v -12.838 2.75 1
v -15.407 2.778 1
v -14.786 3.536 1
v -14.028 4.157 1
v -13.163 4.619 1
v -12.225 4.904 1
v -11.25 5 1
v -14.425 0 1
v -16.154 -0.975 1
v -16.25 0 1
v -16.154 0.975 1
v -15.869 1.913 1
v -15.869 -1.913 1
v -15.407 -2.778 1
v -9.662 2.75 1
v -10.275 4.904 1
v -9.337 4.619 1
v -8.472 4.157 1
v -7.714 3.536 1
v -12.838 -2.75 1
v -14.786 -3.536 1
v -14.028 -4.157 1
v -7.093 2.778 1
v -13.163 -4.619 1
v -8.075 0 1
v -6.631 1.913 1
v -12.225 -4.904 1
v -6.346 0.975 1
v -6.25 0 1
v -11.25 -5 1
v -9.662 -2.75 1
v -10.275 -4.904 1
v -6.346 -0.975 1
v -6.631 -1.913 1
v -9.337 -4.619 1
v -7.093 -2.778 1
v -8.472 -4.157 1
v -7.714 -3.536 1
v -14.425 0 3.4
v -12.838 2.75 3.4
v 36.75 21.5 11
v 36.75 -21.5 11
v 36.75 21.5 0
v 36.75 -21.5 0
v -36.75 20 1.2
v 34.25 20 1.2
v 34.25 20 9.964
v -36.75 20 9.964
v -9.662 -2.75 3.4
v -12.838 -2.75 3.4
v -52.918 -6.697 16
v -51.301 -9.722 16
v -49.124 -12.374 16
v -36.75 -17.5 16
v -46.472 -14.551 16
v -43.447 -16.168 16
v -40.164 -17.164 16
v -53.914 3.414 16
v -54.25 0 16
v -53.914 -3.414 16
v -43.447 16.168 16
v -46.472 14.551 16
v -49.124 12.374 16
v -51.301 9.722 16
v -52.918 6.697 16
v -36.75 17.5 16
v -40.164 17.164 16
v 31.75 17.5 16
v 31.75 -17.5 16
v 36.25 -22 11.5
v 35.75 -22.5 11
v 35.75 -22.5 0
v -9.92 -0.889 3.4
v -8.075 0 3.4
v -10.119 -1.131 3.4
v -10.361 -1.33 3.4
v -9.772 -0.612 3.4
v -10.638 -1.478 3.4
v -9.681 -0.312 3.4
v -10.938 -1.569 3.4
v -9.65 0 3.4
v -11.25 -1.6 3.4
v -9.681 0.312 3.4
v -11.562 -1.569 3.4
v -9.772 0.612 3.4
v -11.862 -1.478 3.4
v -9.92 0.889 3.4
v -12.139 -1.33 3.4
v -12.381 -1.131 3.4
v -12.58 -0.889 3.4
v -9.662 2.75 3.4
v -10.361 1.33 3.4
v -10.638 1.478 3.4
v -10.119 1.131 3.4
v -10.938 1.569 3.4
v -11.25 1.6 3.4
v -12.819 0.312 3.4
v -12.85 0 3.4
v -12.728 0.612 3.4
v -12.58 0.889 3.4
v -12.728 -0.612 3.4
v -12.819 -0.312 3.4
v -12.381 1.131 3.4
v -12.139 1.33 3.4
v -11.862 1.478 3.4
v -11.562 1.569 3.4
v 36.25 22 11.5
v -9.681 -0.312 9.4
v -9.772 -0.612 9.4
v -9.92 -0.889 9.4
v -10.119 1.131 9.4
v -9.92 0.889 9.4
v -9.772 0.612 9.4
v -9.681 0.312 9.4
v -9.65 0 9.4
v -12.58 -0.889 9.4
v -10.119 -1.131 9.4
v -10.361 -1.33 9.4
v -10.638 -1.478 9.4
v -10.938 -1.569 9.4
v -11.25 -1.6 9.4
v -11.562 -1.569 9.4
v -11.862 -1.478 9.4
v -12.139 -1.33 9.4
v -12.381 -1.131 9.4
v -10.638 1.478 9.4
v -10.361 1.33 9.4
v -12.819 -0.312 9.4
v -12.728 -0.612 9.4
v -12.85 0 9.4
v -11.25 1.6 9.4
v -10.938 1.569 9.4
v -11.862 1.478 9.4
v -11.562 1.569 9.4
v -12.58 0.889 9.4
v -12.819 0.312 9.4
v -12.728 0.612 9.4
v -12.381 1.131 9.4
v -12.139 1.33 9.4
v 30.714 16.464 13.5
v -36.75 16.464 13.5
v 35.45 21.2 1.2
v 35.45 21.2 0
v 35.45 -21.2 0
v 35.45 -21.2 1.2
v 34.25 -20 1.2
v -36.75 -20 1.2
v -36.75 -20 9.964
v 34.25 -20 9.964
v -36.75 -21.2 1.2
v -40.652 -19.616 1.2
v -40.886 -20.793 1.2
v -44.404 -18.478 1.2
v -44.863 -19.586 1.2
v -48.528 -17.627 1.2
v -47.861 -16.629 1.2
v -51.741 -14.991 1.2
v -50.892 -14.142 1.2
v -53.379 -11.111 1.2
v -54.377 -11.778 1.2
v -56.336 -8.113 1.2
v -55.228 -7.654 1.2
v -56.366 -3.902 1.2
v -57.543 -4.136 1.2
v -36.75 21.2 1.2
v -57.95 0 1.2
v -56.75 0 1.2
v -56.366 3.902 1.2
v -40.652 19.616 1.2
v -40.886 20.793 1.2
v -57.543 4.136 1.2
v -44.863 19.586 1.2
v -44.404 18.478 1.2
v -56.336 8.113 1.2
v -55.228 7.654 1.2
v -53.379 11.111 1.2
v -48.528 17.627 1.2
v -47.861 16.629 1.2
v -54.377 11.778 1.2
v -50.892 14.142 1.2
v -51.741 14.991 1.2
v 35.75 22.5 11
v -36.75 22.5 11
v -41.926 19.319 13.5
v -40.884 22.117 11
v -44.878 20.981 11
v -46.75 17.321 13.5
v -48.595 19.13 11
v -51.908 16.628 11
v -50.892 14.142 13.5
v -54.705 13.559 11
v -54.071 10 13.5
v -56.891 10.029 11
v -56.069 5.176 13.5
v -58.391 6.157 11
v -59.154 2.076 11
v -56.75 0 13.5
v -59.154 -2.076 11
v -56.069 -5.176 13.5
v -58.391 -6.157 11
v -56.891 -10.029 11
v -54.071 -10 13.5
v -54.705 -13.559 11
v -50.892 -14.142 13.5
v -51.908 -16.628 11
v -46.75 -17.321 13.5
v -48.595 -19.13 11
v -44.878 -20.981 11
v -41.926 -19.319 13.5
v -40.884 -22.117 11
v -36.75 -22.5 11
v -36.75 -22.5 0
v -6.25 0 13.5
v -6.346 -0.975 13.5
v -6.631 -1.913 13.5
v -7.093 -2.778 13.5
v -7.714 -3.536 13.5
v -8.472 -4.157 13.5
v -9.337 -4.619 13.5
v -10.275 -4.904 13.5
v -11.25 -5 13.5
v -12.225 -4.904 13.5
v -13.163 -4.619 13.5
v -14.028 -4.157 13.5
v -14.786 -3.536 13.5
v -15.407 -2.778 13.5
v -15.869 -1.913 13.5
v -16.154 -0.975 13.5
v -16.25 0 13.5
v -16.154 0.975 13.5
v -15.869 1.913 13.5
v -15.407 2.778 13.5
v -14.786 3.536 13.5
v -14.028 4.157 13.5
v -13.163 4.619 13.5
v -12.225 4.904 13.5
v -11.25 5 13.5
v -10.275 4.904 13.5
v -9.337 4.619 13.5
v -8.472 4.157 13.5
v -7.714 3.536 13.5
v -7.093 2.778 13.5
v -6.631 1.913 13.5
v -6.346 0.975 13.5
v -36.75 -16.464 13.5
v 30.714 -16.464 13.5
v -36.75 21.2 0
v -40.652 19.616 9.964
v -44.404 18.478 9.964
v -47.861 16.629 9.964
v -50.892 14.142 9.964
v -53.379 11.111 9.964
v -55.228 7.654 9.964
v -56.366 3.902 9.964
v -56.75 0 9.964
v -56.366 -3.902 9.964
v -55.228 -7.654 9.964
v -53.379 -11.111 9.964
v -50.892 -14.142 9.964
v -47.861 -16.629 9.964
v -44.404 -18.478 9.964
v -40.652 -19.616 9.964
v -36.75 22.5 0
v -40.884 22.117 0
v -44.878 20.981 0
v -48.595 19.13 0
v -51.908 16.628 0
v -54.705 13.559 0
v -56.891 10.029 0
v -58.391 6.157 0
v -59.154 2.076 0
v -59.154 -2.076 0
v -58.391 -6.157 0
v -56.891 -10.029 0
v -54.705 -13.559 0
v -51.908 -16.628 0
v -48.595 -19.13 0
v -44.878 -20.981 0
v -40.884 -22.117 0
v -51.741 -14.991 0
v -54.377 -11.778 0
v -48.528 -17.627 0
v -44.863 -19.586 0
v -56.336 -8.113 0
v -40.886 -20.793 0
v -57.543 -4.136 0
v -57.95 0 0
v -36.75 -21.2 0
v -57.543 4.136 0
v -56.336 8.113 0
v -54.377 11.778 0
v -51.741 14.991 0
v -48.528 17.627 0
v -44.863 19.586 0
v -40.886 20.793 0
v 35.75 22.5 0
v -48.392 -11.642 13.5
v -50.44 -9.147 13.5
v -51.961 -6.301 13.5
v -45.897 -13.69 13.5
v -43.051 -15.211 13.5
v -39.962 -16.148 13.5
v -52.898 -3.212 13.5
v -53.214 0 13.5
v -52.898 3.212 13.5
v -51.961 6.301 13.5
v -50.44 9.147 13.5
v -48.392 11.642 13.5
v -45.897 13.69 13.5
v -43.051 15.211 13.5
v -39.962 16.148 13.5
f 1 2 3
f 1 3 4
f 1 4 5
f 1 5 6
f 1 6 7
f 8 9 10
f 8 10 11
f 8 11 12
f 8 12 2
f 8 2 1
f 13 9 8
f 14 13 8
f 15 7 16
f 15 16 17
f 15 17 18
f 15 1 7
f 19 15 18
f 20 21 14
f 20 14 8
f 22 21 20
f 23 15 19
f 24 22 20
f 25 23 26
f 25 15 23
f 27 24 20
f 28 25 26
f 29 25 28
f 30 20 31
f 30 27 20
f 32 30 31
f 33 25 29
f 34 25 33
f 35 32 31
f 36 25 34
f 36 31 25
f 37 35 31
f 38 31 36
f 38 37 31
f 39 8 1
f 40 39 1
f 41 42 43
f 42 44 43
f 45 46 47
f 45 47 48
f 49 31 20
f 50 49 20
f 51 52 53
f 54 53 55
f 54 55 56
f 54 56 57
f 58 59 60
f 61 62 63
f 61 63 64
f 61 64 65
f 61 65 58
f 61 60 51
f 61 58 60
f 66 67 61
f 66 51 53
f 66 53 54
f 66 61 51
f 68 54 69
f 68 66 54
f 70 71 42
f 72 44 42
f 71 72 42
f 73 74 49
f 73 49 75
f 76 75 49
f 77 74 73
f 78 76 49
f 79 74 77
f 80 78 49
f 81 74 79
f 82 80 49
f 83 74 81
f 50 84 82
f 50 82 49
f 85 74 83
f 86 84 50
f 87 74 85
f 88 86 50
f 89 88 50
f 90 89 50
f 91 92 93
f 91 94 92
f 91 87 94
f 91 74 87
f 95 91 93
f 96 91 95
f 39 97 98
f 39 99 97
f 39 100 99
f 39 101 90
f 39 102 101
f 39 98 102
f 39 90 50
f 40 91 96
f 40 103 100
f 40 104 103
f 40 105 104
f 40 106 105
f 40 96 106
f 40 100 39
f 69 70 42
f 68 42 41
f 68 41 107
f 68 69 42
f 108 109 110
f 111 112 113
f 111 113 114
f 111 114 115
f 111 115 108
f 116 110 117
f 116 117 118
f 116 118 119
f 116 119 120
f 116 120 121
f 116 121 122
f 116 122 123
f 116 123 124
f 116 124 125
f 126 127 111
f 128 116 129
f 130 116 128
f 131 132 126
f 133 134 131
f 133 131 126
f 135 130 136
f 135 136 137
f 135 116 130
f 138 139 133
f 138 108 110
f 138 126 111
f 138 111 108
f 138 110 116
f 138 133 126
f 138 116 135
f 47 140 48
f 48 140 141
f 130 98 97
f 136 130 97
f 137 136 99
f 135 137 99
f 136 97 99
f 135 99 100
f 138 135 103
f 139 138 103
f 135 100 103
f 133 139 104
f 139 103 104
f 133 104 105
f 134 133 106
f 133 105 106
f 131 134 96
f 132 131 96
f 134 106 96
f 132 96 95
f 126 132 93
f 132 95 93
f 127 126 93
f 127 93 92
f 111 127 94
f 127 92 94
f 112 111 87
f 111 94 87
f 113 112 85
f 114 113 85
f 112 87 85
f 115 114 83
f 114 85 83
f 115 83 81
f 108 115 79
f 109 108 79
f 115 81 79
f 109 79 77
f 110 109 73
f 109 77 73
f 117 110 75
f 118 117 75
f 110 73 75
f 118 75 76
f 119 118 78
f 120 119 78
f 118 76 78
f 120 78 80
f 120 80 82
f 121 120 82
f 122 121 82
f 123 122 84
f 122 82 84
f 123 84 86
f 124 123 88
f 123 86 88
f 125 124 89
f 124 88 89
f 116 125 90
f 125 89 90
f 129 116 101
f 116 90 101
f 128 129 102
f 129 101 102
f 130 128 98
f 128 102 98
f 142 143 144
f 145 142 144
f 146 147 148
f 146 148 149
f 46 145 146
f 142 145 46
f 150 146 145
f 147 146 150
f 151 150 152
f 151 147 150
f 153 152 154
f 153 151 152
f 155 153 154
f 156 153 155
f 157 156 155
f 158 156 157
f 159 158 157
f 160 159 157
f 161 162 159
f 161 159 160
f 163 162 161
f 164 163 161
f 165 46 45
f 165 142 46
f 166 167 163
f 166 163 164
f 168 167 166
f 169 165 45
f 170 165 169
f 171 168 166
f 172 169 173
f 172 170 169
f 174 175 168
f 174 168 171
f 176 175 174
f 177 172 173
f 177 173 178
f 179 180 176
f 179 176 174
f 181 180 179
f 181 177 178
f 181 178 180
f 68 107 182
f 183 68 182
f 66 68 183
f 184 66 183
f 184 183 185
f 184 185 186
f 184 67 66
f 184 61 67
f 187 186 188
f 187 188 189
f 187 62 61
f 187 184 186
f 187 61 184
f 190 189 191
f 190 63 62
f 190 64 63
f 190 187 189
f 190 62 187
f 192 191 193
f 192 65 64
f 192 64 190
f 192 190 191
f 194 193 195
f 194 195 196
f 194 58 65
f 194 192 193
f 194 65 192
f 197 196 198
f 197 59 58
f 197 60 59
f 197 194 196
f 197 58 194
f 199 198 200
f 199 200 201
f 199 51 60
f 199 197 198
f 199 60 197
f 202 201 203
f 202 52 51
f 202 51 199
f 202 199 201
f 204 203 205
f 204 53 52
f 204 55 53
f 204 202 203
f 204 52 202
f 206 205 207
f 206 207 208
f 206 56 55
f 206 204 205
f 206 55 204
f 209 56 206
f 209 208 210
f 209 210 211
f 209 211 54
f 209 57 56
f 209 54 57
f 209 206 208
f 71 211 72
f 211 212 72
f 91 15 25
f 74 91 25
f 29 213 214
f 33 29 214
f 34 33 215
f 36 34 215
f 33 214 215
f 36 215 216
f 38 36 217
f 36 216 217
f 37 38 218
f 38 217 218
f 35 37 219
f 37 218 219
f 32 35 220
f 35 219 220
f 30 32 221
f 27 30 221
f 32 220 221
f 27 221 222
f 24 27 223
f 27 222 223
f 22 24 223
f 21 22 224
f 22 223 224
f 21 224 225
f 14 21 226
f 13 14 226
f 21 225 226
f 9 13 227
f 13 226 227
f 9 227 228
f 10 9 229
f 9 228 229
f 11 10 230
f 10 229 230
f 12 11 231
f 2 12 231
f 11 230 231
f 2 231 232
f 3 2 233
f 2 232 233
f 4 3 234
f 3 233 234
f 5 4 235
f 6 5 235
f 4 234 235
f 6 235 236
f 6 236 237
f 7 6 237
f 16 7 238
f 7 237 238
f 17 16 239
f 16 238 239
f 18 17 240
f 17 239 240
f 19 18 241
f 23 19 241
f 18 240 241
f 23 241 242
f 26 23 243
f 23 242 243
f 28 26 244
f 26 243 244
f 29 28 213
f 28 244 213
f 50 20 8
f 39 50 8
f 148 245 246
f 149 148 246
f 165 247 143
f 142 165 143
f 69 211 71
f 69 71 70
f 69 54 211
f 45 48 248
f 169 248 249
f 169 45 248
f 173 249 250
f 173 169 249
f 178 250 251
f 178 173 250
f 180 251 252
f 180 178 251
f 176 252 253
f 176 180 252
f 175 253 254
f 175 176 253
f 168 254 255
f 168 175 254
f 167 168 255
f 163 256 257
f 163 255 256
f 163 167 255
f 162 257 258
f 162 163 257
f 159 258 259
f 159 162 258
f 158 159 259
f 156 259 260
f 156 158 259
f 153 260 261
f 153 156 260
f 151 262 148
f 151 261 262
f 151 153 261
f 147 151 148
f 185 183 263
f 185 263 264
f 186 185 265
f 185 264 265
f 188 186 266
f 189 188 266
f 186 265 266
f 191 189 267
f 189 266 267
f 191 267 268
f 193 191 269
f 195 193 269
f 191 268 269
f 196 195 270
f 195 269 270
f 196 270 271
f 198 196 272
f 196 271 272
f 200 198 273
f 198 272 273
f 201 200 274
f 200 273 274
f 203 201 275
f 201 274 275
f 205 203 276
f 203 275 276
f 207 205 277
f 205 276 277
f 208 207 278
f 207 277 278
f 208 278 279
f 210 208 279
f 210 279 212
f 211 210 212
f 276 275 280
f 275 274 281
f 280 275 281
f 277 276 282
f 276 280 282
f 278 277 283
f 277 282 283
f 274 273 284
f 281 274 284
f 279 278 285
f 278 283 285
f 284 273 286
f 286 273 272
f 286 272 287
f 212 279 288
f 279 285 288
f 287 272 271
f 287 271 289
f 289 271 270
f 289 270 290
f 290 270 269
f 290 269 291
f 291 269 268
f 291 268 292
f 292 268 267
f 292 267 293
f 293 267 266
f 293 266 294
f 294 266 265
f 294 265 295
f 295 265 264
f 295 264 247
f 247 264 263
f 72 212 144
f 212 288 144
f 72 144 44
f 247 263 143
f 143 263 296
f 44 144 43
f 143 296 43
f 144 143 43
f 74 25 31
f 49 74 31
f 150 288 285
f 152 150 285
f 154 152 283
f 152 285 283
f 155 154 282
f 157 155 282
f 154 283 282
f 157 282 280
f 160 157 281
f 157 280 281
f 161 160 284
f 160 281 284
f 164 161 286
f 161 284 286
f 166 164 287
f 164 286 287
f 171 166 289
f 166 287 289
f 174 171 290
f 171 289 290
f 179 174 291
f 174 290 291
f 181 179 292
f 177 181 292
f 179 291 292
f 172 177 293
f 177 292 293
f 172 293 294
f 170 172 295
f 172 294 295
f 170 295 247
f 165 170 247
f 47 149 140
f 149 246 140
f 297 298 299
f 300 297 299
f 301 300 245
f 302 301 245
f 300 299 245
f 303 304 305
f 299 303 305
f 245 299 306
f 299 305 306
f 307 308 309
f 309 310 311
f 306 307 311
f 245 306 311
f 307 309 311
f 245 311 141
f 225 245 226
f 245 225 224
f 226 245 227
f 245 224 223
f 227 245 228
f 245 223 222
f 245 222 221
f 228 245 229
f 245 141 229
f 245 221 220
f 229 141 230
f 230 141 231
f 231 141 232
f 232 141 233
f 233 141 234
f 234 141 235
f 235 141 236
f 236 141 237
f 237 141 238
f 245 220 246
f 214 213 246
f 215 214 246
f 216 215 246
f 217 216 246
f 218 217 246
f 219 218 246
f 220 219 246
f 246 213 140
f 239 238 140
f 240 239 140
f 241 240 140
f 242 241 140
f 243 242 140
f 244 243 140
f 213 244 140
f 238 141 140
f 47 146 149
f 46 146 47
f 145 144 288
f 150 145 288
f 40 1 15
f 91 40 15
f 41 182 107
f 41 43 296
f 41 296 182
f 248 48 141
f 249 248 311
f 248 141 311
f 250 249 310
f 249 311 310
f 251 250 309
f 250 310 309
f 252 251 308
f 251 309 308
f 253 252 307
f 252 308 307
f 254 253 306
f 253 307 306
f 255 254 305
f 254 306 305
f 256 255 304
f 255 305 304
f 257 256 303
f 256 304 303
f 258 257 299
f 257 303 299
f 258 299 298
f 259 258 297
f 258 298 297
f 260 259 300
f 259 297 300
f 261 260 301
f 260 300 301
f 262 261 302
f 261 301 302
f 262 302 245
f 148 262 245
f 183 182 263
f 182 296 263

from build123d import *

# Parameters (mm, degrees)
EXTRUDE_1_DEPTH     = 16
CHAMFER_1_SIZE      = 5
SHELL_1_T           = -2.5
CUT_EXTRUDE_1_DEPTH = 1.2
SKETCH_3_R          = 5
EXTRUDE_2_DEPTH     = 12.5
CUT_EXTRUDE_2_DEPTH = 2.4
SKETCH_5_R          = 1.6
CUT_EXTRUDE_3_DEPTH = 6
CHAMFER_2_SIZE      = 1


with BuildPart() as part:
    # 草图1 → 凸台-拉伸1 (new body)
    with BuildSketch(Plane.XY):
        with BuildLine():
            ThreePointArc((-14.25, 0), (-20.840097423, 15.909902577), (-36.75, 22.5))
            Line((-36.75, 22.5), (-36.75, -22.5))
            ThreePointArc((-36.75, -22.5), (-20.840097423, -15.909902577), (-14.25, 0))
        make_face()
        with BuildLine():
            Line((-36.75, -22.5), (-36.75, 22.5))
            ThreePointArc((-36.75, 22.5), (-59.25, 0), (-36.75, -22.5))
        make_face()
        with BuildLine():
            Line((36.75, 22.5), (-36.75, 22.5))
            ThreePointArc((-36.75, 22.5), (-20.840097423, 15.909902577), (-14.25, 0))
            ThreePointArc((-14.25, 0), (-20.840097423, -15.909902577), (-36.75, -22.5))
            Line((-36.75, -22.5), (36.75, -22.5))
            Line((36.75, -22.5), (36.75, 22.5))
        make_face()
    extrude(amount=EXTRUDE_1_DEPTH)

    # 倒角1
    chamfer_1_edges = [part.edges().sort_by_distance(p)[0] for p in [
        (0, -22.5, 16),
        (36.75, 0, 16),
        (0, 22.5, 16),
        (-59.25, 0, 16),
    ]]
    chamfer(chamfer_1_edges, length=CHAMFER_1_SIZE)

    # 抽壳1
    shell_1_openings = [part.faces().sort_by_distance(p)[0] for p in [
        (-8.974037689, 0, 0),
    ]]
    offset(amount=SHELL_1_T, openings=shell_1_openings, kind=Kind.INTERSECTION)

    # 草图2 → 切除-拉伸1 (cut)
    with BuildSketch(Plane(origin=(0, 0, 0), x_dir=(-1, 0, 0), z_dir=(0, 0, -1))):
        with BuildLine():
            Line((36.75, 21.2), (-35.45, 21.2))
            Line((-35.45, 21.2), (-35.45, -21.2))
            Line((-35.45, -21.2), (36.75, -21.2))
            ThreePointArc((36.75, -21.2), (57.95, 0), (36.75, 21.2))
        make_face()
        with BuildLine():
            Line((36.75, -20), (-34.25, -20))
            Line((-34.25, -20), (-34.25, 20))
            Line((-34.25, 20), (36.75, 20))
            ThreePointArc((36.75, 20), (56.75, 0), (36.75, -20))
        make_face(mode=Mode.SUBTRACT)
    extrude(amount=-CUT_EXTRUDE_1_DEPTH, mode=Mode.SUBTRACT)

    # 草图3 → 凸台-拉伸2 (add)
    with BuildSketch(Plane(origin=(0, 0, 13.5), x_dir=(-1, 0, 0), z_dir=(0, 0, -1))):
        with Locations(Location((11.25, 0, 0), (0, 0, 180))):
            Circle(SKETCH_3_R)
    extrude(amount=EXTRUDE_2_DEPTH)

    # 草图4 → 切除-拉伸2 (cut)
    with BuildSketch(Plane(origin=(0, 0, 1), x_dir=(-1, 0, 0), z_dir=(0, 0, -1))):
        Polygon((9.66228676, -2.75), (12.83771324, -2.75), (14.425426481, 0), (12.83771324, 2.75), (9.66228676, 2.75), (8.074573519, 0), align=None)
    extrude(amount=-CUT_EXTRUDE_2_DEPTH, mode=Mode.SUBTRACT)

    # 草图5 → 切除-拉伸3 (cut)
    with BuildSketch(Plane(origin=(0, 0, 3.4), x_dir=(-1, 0, 0), z_dir=(0, 0, -1))):
        with Locations((11.25, 0)):
            Circle(SKETCH_5_R)
    extrude(amount=-CUT_EXTRUDE_3_DEPTH, mode=Mode.SUBTRACT)

    # 倒角2
    chamfer_2_edges = [part.edges().sort_by_distance(p)[0] for p in [
        (36.75, -22.5, 5.5),
        (36.75, 22.5, 5.5),
    ]]
    chamfer(chamfer_2_edges, length=CHAMFER_2_SIZE)


solid = part.part
